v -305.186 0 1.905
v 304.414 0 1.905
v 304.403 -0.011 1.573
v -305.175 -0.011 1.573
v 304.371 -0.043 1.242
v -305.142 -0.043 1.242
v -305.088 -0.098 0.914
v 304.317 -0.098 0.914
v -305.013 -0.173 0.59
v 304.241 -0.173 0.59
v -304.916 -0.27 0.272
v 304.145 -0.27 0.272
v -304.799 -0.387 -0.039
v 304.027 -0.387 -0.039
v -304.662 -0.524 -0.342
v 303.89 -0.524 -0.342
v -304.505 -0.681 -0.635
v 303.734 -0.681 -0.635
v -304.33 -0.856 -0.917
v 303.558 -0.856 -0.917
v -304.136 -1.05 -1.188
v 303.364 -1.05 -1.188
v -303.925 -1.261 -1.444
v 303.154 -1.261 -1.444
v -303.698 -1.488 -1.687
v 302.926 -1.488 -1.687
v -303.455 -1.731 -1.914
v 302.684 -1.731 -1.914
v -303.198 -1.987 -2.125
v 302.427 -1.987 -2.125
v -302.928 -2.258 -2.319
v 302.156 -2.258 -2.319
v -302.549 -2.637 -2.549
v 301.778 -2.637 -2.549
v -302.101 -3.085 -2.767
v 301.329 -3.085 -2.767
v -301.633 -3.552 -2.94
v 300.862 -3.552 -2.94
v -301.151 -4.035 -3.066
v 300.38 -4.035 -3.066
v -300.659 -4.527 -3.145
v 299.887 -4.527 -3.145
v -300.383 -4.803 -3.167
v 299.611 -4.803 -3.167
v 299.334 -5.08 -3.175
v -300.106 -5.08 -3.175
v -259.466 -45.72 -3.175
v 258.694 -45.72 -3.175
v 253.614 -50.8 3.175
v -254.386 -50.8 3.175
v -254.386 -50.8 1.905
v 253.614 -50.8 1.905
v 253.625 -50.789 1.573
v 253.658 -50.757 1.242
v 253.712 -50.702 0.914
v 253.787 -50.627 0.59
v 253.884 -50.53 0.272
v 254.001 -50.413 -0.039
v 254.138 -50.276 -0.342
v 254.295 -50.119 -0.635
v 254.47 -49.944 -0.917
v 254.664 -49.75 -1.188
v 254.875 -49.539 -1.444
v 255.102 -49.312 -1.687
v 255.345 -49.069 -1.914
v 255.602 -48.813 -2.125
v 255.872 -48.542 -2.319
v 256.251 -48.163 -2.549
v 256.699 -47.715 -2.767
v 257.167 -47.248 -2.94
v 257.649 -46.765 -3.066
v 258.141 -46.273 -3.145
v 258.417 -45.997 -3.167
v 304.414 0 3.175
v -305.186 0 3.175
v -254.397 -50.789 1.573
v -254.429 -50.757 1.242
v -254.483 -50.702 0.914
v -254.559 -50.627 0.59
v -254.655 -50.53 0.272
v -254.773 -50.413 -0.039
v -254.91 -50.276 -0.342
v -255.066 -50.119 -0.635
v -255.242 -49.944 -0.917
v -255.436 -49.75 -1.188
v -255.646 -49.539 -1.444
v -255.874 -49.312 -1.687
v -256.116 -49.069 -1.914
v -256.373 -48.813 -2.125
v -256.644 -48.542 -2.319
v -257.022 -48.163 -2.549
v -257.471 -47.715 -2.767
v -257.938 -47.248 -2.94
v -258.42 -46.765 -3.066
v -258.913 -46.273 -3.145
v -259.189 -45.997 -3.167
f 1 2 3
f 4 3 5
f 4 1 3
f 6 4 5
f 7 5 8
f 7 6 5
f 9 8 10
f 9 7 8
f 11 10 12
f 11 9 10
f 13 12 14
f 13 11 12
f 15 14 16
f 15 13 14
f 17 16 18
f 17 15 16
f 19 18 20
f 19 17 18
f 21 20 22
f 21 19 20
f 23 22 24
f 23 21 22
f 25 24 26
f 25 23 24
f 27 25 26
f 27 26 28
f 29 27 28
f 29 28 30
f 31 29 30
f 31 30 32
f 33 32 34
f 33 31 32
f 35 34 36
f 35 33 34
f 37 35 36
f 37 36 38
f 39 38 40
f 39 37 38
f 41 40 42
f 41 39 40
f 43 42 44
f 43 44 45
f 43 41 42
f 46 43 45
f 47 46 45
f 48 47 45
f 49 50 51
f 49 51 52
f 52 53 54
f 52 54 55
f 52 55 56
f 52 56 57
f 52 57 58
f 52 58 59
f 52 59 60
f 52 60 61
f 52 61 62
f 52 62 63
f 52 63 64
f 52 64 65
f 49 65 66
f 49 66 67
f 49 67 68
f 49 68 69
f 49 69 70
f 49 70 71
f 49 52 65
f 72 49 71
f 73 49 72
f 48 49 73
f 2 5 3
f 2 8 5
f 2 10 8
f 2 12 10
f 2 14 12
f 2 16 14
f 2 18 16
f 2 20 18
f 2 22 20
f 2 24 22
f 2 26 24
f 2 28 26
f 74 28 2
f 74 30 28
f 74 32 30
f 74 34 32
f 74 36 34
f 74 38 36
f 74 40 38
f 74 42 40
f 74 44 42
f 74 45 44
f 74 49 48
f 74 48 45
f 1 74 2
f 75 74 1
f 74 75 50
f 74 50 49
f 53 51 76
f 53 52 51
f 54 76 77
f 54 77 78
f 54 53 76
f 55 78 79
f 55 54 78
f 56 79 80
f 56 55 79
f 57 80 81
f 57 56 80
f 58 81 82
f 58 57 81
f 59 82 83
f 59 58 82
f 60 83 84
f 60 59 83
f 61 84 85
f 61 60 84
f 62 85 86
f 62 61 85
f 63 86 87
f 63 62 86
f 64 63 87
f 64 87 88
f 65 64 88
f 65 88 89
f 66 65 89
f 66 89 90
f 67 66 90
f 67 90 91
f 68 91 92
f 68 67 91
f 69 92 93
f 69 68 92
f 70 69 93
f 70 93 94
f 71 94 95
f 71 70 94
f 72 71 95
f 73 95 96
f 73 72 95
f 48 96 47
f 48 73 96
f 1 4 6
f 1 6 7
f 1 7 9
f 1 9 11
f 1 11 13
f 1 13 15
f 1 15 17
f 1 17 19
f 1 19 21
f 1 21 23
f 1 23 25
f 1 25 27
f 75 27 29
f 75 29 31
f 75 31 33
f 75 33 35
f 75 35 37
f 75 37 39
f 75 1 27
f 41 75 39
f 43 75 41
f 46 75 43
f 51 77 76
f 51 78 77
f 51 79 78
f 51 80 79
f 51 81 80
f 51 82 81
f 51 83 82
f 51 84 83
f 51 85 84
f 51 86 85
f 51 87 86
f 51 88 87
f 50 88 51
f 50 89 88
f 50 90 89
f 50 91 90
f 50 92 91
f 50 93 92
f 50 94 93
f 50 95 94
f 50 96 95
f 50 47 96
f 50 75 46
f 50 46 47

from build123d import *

# Parameters (mm, degrees)
F1_DEPTH = 3.175
F2_R     = 5.08


with BuildPart() as f1:
    # F0 (on Top) → F1 (new body, symmetric)
    with BuildSketch(Plane.XY):
        Polygon((304.414174, 0), (-305.185826, 0), (-254.385826, -50.8), (253.614174, -50.8), align=None)
    extrude(amount=F1_DEPTH, both=True)

    # F2
    f2_edges = [f1.edges().sort_by_distance(p)[0] for p in [
        (-0.385826, -50.8, -3.175),
        (-0.385826, 0, -3.175),
    ]]
    fillet(f2_edges, radius=F2_R)


solid = f1.part
